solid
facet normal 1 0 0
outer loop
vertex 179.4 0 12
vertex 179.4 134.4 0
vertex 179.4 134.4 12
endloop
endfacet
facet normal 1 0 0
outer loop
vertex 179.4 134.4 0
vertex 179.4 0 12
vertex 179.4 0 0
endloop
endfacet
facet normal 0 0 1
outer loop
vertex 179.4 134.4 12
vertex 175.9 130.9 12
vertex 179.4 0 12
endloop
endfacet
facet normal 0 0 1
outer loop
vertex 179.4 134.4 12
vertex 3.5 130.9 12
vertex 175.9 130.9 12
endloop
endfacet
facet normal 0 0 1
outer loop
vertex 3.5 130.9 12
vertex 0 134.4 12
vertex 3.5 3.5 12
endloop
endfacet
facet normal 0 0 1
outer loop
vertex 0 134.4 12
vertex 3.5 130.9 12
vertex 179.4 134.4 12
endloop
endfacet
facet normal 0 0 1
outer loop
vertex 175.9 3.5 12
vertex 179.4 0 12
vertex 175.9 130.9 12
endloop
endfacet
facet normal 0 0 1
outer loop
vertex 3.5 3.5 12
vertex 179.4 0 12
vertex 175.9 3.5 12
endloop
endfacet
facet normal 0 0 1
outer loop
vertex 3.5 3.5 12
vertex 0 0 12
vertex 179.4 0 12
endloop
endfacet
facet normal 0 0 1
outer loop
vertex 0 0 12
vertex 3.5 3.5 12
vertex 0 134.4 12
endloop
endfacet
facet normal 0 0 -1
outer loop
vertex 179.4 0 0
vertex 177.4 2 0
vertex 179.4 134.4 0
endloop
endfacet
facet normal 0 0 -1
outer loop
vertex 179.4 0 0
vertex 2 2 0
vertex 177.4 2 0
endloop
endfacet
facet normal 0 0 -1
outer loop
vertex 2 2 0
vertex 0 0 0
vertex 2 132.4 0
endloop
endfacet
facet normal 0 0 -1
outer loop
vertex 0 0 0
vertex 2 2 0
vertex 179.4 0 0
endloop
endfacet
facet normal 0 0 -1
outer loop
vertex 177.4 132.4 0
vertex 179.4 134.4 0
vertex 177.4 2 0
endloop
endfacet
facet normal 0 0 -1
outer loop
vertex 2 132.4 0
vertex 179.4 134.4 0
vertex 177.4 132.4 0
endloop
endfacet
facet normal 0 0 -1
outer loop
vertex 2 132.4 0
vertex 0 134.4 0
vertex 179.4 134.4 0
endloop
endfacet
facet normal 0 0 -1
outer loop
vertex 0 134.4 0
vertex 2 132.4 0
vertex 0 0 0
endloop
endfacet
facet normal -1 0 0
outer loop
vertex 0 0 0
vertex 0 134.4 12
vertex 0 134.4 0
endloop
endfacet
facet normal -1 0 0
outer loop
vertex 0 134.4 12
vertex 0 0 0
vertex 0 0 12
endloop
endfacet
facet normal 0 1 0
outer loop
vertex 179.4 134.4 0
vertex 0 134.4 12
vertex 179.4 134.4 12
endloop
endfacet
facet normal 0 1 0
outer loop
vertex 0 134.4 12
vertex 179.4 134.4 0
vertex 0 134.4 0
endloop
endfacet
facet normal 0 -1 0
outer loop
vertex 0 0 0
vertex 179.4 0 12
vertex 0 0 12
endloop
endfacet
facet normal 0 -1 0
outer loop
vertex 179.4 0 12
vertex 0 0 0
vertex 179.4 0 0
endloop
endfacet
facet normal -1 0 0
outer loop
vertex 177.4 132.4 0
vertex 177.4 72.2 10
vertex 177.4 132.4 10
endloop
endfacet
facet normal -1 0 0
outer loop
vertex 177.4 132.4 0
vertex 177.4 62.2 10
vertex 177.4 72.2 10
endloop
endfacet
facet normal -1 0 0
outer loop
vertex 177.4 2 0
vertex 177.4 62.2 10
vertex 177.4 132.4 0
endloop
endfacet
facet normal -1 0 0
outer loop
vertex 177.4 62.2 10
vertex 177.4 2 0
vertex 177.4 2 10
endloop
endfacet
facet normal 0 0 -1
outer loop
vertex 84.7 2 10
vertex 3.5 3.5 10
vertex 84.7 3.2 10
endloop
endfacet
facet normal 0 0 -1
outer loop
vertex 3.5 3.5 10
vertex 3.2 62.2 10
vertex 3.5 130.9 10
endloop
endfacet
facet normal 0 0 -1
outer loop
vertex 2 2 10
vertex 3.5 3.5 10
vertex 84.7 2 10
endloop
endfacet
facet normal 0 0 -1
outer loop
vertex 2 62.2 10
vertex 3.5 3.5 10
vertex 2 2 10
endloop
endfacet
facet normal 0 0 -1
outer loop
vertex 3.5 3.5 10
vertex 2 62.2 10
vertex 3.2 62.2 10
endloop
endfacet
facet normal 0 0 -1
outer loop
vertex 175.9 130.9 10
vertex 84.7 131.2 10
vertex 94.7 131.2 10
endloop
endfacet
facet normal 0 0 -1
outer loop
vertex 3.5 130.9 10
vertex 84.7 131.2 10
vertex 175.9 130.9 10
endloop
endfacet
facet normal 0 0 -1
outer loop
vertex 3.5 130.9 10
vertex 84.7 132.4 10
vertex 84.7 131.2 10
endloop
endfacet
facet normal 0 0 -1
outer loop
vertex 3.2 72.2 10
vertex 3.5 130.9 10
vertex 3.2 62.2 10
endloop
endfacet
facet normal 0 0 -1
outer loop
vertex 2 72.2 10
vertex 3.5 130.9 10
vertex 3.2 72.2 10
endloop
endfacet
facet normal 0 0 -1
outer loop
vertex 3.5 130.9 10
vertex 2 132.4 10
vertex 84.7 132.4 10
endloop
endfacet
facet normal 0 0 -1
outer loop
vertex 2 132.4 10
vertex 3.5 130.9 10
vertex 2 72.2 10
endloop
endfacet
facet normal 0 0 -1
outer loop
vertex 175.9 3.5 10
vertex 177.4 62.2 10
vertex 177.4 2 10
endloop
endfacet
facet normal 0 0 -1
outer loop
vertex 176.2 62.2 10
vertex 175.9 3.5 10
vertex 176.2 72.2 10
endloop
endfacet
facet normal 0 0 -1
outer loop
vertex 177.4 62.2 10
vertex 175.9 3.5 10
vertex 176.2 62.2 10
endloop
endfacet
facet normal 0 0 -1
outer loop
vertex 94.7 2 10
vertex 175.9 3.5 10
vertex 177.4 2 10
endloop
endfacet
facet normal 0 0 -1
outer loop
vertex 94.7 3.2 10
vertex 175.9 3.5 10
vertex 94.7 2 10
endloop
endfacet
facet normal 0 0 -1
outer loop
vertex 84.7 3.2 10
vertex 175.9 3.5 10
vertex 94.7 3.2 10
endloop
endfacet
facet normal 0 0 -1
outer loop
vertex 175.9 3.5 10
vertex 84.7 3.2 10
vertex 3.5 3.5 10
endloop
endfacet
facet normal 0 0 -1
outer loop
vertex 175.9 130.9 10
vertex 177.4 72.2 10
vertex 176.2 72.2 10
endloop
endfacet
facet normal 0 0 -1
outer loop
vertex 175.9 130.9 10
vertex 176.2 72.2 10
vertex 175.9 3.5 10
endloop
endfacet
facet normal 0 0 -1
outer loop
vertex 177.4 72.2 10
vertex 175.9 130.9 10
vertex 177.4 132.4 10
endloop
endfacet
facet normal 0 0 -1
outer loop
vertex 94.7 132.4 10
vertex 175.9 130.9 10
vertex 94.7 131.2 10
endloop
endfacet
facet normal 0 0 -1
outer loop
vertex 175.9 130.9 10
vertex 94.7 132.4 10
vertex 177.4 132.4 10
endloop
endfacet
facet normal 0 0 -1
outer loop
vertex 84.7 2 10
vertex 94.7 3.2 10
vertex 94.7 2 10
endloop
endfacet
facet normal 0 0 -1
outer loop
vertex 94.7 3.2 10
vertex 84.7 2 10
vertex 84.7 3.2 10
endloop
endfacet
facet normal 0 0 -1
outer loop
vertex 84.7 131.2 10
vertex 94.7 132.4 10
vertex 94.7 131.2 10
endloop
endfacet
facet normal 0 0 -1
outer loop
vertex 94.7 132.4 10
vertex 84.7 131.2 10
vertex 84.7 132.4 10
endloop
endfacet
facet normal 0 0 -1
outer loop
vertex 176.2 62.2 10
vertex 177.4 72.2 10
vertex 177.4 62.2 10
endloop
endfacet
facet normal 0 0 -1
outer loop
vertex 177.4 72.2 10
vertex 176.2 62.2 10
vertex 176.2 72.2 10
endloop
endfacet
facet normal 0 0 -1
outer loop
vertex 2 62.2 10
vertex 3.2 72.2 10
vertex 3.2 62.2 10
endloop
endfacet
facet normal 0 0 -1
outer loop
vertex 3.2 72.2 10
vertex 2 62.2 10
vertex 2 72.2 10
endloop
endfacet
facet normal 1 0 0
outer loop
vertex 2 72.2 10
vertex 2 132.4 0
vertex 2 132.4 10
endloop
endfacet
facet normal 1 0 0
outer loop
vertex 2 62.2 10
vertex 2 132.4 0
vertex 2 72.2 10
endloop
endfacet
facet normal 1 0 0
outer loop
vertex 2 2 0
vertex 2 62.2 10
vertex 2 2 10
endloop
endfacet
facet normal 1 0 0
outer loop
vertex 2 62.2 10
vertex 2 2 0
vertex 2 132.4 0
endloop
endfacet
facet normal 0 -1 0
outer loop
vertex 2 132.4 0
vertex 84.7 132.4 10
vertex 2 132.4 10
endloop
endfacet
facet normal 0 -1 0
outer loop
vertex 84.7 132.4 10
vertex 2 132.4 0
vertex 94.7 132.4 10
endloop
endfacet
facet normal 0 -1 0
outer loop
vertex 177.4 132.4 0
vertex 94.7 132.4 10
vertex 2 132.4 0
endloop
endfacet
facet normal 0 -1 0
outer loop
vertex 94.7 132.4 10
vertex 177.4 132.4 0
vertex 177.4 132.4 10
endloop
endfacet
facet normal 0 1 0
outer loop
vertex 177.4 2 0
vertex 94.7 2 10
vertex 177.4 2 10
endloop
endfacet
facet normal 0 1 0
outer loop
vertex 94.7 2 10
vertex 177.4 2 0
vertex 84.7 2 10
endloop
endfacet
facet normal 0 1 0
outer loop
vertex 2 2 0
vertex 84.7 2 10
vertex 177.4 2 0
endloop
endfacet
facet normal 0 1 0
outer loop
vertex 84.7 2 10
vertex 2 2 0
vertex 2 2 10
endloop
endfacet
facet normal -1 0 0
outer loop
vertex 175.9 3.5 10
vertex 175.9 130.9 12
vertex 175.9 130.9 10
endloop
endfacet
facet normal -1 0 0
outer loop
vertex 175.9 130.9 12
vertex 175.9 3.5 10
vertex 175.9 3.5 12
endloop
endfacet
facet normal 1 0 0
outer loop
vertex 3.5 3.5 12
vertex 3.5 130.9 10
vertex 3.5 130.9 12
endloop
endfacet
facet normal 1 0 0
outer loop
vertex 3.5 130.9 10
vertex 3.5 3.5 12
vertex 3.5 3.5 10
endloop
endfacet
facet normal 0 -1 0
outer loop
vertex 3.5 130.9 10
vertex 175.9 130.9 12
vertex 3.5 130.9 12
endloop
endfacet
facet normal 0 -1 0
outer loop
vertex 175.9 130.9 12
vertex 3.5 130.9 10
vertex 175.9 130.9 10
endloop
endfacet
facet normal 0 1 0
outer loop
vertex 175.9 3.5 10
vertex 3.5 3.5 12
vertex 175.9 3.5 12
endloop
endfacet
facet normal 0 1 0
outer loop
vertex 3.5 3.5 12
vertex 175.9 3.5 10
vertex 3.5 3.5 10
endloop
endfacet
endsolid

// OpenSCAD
// ==========================================
// Word Clock Snap-Fit Frame Generator
// ==========================================

// --- 1. DIMENSIONS (Must match your Diverter) ---
total_width = 175;    // Matching diverter width
total_height = 130;   // Matching diverter height
diverter_depth = 10;  // Thickness of the diverter plate

// --- 2. SNAP FIT SETTINGS ---
wall_thickness = 2.0; // Outer wall of the frame
frame_lip = 1.5;      // How much the frame overlaps the diverter
clearance = 0.2;      // Print tolerance (increase if too tight)
snap_height = 2.0;    // Height of the "locking" tab

// ==========================================
// FRAME RENDER LOGIC
// ==========================================

module snap_frame() {
    // Inner dimensions with clearance
    inner_w = total_width + (clearance * 2);
    inner_h = total_height + (clearance * 2);
    
    // Outer dimensions
    outer_w = inner_w + (wall_thickness * 2);
    outer_h = inner_h + (wall_thickness * 2);
    
    difference() {
        // Main Frame Body
        cube([outer_w, outer_h, diverter_depth + snap_height]);

        // Subtract the cavity for the diverter
        translate([wall_thickness, wall_thickness, -1])
            cube([inner_w, inner_h, diverter_depth + 1]);

        // Subtract the "View Window" (hollow center)
        // This leaves the 'lip' that holds the faceplate/diverter
        translate([wall_thickness + frame_lip, wall_thickness + frame_lip, -2])
            cube([inner_w - (frame_lip * 2), inner_h - (frame_lip * 2), diverter_depth + snap_height + 4]);
    }
    
    // Add Snap-Fit Tabs
    // These are small wedges on the inside of the frame walls
    tab_size = 10;
    
    // Position tabs on all four sides
    // Bottom side
    translate([outer_w/2 - tab_size/2, wall_thickness, diverter_depth])
        snap_tab(tab_size);
    
    // Top side
    translate([outer_w/2 + tab_size/2, outer_h - wall_thickness, diverter_depth])
        rotate([0,0,180]) snap_tab(tab_size);
        
    // Left side
    translate([wall_thickness, outer_h/2 + tab_size/2, diverter_depth])
        rotate([0,0,270]) snap_tab(tab_size);
        
    // Right side
    translate([outer_w - wall_thickness, outer_h/2 - tab_size/2, diverter_depth])
        rotate([0,0,90]) snap_tab(tab_size);
}

module snap_tab(w) {
    // A small triangular prism that slopes inward to lock the plate
    rotate([90, 0, 90])
    linear_extrude(height = w)
    polygon(points=[[0,0], [frame_lip * 0.8, 0], [0, snap_height]]);
}

// Render
snap_frame();

// ==========================================
// PRINTING TIPS:
// 1. Print this with the "lip" facing down on the bed.
// 2. Use a material with slight flex like PETG for best snap results. 
// 3. If using PLA, the tabs may be stiff; adjust 'clearance' if needed.
